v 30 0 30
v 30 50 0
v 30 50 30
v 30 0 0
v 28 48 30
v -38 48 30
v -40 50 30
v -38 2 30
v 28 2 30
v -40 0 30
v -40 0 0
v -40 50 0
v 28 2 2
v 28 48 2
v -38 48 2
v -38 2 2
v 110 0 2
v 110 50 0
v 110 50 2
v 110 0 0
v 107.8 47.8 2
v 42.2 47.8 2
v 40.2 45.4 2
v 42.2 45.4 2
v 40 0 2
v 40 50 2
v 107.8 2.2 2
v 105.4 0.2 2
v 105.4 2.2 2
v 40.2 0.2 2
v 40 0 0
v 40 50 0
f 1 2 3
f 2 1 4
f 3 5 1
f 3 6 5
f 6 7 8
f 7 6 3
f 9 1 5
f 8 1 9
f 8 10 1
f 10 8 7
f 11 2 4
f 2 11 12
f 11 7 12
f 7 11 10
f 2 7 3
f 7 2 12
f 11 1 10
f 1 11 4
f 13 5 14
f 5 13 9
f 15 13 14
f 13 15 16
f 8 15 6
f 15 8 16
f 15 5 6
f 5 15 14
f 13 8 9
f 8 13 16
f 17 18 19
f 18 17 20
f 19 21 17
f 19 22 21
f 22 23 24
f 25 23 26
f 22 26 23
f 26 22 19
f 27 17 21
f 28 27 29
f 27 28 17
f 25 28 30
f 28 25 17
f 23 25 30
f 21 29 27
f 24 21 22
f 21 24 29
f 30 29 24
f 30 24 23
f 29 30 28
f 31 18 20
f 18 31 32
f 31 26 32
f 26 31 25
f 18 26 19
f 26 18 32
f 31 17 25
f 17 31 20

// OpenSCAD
// Two-part enclosure for small electronics board
// Part 1: Box (Left)
// Part 2: Lid (Right, printed upside down as specified)
// Prints together with a 10mm gap between them.

// --- Dimensions ---
// Box Outer Dimensions (X x Y x Z)
$box_outer_x = 70;
$box_outer_y = 50;
$box_outer_z = 30;

// Wall and Floor Thickness
$wall_thickness = 2;
$floor_thickness = 2;

// Lid Dimensions
// Plate thickness
$plate_thickness = 2;
// Lip thickness
$lip_thickness = 1.5;
// Lip height (extends above plate)
$lip_height = 4;
// Lip Outer Size (X x Y)
$lip_outer_x = 65.6;
$lip_outer_y = 45.6;

// Clearance
// The lip outer size is 65.6 vs box inner 66.0 (70 - 2*2).
// Difference is 0.4mm total, so 0.2mm clearance per side.
$clearance_x = 0.2;
$clearance_y = 0.2;

// Gap between parts
$gap_between_parts = 10;

// --- Configuration ---
$fn = 64; // Smooth curves

// --- Positioning ---
// Center the whole assembly on X=0.
// Box X center: -(gap + box/2)
// Lid X center: +(gap + box/2)
// Both centered on Y=0.

$box_x_pos = -($gap_between_parts/2 + $box_outer_x/2);
$box_y_pos = 0;
$box_z_pos = 0;

$lid_x_pos = $gap_between_parts/2 + $box_outer_x/2;
$lid_y_pos = 0;
$lid_z_pos = 0;

// --- Part 1: The Box ---
translate([
    $box_x_pos, 
    $box_y_pos, 
    $box_z_pos
])
difference() {
    // Outer Block
    cube([
        $box_outer_x, 
        $box_outer_y, 
        $box_outer_z
    ]);
    
    // Cut out the inside (open top)
    // Inner dimensions:
    // X: 70 - 2*2 = 66
    // Y: 50 - 2*2 = 46
    // Z: 30 - 2 (floor) = 28
    translate([
        $wall_thickness, 
        $wall_thickness, 
        $floor_thickness
    ])
    cube([
        $box_outer_x - (2 * $wall_thickness), 
        $box_outer_y - (2 * $wall_thickness), 
        $box_outer_z - $floor_thickness
    ]);
}

// --- Part 2: The Lid ---
// Specification: "printed upside down: a plate 70 x 50 x 2 mm lying on the bed, 
// with a rectangular lip on top of it".
// This means the plate is at Z=0 and the lip grows in +Z.
// The lip dimensions are defined by its outer size (65.6 x 45.6) and thickness (1.5).
// The lip sits on the plate.
// To match the clearance:
// Box Inner X = 66. Lip Outer X = 65.6. Gap = 0.4mm (0.2mm each side).
// Box Inner Y = 46. Lip Outer Y = 45.6. Gap = 0.4mm (0.2mm each side).
// This geometry allows the lip to slide into the box opening if the lid were placed on top.
// Since they print side-by-side, this part is just a block sitting on the bed.

translate([
    $lid_x_pos, 
    $lid_y_pos, 
    $lid_z_pos
])
difference() {
    // 1. The Base Plate (70 x 50 x 2)
    cube([
        $box_outer_x, 
        $box_outer_y, 
        $plate_thickness
    ]);
    
    // 2. The Lip (Rectangular block on top of the plate)
    // Outer size: 65.6 x 45.6
    // Thickness: 1.5
    // It sits on top of the plate (Z starts at 2.0)
    translate([
        ($box_outer_x - $lip_outer_x) / 2, 
        ($box_outer_y - $lip_outer_y) / 2, 
        $plate_thickness
    ])
    cube([
        $lip_outer_x, 
        $lip_outer_y, 
        $lip_thickness
    ]);
    
    // 3. The Hole (Cutout inside the lip)
    // The lip is a "wall" or "frame". We need to cut the inside of the lip.
    // Lip Outer: 65.6 x 45.6
    // Clearance: 0.2mm per side.
    // Lip Inner: (65.6 - 0.4) x (45.6 - 0.4) = 65.2 x 45.2
    // Thickness of the cut: The lip is 1.5mm thick.
    // We cut a hole that is 1.5mm deep (into the lip) and extends slightly past the bottom to ensure clean separation from the plate.
    translate([
        ($lip_outer_x - ($lip_outer_x - 0.4)) / 2, 
        ($lip_outer_y - ($lip_outer_y - 0.4)) / 2, 
        $plate_thickness
    ])
    cube([
        $lip_outer_x - 0.4, 
        $lip_outer_y - 0.4, 
        $lip_thickness + 0.1 // Extend slightly past the lip bottom to ensure clean cut
    ]);
}
